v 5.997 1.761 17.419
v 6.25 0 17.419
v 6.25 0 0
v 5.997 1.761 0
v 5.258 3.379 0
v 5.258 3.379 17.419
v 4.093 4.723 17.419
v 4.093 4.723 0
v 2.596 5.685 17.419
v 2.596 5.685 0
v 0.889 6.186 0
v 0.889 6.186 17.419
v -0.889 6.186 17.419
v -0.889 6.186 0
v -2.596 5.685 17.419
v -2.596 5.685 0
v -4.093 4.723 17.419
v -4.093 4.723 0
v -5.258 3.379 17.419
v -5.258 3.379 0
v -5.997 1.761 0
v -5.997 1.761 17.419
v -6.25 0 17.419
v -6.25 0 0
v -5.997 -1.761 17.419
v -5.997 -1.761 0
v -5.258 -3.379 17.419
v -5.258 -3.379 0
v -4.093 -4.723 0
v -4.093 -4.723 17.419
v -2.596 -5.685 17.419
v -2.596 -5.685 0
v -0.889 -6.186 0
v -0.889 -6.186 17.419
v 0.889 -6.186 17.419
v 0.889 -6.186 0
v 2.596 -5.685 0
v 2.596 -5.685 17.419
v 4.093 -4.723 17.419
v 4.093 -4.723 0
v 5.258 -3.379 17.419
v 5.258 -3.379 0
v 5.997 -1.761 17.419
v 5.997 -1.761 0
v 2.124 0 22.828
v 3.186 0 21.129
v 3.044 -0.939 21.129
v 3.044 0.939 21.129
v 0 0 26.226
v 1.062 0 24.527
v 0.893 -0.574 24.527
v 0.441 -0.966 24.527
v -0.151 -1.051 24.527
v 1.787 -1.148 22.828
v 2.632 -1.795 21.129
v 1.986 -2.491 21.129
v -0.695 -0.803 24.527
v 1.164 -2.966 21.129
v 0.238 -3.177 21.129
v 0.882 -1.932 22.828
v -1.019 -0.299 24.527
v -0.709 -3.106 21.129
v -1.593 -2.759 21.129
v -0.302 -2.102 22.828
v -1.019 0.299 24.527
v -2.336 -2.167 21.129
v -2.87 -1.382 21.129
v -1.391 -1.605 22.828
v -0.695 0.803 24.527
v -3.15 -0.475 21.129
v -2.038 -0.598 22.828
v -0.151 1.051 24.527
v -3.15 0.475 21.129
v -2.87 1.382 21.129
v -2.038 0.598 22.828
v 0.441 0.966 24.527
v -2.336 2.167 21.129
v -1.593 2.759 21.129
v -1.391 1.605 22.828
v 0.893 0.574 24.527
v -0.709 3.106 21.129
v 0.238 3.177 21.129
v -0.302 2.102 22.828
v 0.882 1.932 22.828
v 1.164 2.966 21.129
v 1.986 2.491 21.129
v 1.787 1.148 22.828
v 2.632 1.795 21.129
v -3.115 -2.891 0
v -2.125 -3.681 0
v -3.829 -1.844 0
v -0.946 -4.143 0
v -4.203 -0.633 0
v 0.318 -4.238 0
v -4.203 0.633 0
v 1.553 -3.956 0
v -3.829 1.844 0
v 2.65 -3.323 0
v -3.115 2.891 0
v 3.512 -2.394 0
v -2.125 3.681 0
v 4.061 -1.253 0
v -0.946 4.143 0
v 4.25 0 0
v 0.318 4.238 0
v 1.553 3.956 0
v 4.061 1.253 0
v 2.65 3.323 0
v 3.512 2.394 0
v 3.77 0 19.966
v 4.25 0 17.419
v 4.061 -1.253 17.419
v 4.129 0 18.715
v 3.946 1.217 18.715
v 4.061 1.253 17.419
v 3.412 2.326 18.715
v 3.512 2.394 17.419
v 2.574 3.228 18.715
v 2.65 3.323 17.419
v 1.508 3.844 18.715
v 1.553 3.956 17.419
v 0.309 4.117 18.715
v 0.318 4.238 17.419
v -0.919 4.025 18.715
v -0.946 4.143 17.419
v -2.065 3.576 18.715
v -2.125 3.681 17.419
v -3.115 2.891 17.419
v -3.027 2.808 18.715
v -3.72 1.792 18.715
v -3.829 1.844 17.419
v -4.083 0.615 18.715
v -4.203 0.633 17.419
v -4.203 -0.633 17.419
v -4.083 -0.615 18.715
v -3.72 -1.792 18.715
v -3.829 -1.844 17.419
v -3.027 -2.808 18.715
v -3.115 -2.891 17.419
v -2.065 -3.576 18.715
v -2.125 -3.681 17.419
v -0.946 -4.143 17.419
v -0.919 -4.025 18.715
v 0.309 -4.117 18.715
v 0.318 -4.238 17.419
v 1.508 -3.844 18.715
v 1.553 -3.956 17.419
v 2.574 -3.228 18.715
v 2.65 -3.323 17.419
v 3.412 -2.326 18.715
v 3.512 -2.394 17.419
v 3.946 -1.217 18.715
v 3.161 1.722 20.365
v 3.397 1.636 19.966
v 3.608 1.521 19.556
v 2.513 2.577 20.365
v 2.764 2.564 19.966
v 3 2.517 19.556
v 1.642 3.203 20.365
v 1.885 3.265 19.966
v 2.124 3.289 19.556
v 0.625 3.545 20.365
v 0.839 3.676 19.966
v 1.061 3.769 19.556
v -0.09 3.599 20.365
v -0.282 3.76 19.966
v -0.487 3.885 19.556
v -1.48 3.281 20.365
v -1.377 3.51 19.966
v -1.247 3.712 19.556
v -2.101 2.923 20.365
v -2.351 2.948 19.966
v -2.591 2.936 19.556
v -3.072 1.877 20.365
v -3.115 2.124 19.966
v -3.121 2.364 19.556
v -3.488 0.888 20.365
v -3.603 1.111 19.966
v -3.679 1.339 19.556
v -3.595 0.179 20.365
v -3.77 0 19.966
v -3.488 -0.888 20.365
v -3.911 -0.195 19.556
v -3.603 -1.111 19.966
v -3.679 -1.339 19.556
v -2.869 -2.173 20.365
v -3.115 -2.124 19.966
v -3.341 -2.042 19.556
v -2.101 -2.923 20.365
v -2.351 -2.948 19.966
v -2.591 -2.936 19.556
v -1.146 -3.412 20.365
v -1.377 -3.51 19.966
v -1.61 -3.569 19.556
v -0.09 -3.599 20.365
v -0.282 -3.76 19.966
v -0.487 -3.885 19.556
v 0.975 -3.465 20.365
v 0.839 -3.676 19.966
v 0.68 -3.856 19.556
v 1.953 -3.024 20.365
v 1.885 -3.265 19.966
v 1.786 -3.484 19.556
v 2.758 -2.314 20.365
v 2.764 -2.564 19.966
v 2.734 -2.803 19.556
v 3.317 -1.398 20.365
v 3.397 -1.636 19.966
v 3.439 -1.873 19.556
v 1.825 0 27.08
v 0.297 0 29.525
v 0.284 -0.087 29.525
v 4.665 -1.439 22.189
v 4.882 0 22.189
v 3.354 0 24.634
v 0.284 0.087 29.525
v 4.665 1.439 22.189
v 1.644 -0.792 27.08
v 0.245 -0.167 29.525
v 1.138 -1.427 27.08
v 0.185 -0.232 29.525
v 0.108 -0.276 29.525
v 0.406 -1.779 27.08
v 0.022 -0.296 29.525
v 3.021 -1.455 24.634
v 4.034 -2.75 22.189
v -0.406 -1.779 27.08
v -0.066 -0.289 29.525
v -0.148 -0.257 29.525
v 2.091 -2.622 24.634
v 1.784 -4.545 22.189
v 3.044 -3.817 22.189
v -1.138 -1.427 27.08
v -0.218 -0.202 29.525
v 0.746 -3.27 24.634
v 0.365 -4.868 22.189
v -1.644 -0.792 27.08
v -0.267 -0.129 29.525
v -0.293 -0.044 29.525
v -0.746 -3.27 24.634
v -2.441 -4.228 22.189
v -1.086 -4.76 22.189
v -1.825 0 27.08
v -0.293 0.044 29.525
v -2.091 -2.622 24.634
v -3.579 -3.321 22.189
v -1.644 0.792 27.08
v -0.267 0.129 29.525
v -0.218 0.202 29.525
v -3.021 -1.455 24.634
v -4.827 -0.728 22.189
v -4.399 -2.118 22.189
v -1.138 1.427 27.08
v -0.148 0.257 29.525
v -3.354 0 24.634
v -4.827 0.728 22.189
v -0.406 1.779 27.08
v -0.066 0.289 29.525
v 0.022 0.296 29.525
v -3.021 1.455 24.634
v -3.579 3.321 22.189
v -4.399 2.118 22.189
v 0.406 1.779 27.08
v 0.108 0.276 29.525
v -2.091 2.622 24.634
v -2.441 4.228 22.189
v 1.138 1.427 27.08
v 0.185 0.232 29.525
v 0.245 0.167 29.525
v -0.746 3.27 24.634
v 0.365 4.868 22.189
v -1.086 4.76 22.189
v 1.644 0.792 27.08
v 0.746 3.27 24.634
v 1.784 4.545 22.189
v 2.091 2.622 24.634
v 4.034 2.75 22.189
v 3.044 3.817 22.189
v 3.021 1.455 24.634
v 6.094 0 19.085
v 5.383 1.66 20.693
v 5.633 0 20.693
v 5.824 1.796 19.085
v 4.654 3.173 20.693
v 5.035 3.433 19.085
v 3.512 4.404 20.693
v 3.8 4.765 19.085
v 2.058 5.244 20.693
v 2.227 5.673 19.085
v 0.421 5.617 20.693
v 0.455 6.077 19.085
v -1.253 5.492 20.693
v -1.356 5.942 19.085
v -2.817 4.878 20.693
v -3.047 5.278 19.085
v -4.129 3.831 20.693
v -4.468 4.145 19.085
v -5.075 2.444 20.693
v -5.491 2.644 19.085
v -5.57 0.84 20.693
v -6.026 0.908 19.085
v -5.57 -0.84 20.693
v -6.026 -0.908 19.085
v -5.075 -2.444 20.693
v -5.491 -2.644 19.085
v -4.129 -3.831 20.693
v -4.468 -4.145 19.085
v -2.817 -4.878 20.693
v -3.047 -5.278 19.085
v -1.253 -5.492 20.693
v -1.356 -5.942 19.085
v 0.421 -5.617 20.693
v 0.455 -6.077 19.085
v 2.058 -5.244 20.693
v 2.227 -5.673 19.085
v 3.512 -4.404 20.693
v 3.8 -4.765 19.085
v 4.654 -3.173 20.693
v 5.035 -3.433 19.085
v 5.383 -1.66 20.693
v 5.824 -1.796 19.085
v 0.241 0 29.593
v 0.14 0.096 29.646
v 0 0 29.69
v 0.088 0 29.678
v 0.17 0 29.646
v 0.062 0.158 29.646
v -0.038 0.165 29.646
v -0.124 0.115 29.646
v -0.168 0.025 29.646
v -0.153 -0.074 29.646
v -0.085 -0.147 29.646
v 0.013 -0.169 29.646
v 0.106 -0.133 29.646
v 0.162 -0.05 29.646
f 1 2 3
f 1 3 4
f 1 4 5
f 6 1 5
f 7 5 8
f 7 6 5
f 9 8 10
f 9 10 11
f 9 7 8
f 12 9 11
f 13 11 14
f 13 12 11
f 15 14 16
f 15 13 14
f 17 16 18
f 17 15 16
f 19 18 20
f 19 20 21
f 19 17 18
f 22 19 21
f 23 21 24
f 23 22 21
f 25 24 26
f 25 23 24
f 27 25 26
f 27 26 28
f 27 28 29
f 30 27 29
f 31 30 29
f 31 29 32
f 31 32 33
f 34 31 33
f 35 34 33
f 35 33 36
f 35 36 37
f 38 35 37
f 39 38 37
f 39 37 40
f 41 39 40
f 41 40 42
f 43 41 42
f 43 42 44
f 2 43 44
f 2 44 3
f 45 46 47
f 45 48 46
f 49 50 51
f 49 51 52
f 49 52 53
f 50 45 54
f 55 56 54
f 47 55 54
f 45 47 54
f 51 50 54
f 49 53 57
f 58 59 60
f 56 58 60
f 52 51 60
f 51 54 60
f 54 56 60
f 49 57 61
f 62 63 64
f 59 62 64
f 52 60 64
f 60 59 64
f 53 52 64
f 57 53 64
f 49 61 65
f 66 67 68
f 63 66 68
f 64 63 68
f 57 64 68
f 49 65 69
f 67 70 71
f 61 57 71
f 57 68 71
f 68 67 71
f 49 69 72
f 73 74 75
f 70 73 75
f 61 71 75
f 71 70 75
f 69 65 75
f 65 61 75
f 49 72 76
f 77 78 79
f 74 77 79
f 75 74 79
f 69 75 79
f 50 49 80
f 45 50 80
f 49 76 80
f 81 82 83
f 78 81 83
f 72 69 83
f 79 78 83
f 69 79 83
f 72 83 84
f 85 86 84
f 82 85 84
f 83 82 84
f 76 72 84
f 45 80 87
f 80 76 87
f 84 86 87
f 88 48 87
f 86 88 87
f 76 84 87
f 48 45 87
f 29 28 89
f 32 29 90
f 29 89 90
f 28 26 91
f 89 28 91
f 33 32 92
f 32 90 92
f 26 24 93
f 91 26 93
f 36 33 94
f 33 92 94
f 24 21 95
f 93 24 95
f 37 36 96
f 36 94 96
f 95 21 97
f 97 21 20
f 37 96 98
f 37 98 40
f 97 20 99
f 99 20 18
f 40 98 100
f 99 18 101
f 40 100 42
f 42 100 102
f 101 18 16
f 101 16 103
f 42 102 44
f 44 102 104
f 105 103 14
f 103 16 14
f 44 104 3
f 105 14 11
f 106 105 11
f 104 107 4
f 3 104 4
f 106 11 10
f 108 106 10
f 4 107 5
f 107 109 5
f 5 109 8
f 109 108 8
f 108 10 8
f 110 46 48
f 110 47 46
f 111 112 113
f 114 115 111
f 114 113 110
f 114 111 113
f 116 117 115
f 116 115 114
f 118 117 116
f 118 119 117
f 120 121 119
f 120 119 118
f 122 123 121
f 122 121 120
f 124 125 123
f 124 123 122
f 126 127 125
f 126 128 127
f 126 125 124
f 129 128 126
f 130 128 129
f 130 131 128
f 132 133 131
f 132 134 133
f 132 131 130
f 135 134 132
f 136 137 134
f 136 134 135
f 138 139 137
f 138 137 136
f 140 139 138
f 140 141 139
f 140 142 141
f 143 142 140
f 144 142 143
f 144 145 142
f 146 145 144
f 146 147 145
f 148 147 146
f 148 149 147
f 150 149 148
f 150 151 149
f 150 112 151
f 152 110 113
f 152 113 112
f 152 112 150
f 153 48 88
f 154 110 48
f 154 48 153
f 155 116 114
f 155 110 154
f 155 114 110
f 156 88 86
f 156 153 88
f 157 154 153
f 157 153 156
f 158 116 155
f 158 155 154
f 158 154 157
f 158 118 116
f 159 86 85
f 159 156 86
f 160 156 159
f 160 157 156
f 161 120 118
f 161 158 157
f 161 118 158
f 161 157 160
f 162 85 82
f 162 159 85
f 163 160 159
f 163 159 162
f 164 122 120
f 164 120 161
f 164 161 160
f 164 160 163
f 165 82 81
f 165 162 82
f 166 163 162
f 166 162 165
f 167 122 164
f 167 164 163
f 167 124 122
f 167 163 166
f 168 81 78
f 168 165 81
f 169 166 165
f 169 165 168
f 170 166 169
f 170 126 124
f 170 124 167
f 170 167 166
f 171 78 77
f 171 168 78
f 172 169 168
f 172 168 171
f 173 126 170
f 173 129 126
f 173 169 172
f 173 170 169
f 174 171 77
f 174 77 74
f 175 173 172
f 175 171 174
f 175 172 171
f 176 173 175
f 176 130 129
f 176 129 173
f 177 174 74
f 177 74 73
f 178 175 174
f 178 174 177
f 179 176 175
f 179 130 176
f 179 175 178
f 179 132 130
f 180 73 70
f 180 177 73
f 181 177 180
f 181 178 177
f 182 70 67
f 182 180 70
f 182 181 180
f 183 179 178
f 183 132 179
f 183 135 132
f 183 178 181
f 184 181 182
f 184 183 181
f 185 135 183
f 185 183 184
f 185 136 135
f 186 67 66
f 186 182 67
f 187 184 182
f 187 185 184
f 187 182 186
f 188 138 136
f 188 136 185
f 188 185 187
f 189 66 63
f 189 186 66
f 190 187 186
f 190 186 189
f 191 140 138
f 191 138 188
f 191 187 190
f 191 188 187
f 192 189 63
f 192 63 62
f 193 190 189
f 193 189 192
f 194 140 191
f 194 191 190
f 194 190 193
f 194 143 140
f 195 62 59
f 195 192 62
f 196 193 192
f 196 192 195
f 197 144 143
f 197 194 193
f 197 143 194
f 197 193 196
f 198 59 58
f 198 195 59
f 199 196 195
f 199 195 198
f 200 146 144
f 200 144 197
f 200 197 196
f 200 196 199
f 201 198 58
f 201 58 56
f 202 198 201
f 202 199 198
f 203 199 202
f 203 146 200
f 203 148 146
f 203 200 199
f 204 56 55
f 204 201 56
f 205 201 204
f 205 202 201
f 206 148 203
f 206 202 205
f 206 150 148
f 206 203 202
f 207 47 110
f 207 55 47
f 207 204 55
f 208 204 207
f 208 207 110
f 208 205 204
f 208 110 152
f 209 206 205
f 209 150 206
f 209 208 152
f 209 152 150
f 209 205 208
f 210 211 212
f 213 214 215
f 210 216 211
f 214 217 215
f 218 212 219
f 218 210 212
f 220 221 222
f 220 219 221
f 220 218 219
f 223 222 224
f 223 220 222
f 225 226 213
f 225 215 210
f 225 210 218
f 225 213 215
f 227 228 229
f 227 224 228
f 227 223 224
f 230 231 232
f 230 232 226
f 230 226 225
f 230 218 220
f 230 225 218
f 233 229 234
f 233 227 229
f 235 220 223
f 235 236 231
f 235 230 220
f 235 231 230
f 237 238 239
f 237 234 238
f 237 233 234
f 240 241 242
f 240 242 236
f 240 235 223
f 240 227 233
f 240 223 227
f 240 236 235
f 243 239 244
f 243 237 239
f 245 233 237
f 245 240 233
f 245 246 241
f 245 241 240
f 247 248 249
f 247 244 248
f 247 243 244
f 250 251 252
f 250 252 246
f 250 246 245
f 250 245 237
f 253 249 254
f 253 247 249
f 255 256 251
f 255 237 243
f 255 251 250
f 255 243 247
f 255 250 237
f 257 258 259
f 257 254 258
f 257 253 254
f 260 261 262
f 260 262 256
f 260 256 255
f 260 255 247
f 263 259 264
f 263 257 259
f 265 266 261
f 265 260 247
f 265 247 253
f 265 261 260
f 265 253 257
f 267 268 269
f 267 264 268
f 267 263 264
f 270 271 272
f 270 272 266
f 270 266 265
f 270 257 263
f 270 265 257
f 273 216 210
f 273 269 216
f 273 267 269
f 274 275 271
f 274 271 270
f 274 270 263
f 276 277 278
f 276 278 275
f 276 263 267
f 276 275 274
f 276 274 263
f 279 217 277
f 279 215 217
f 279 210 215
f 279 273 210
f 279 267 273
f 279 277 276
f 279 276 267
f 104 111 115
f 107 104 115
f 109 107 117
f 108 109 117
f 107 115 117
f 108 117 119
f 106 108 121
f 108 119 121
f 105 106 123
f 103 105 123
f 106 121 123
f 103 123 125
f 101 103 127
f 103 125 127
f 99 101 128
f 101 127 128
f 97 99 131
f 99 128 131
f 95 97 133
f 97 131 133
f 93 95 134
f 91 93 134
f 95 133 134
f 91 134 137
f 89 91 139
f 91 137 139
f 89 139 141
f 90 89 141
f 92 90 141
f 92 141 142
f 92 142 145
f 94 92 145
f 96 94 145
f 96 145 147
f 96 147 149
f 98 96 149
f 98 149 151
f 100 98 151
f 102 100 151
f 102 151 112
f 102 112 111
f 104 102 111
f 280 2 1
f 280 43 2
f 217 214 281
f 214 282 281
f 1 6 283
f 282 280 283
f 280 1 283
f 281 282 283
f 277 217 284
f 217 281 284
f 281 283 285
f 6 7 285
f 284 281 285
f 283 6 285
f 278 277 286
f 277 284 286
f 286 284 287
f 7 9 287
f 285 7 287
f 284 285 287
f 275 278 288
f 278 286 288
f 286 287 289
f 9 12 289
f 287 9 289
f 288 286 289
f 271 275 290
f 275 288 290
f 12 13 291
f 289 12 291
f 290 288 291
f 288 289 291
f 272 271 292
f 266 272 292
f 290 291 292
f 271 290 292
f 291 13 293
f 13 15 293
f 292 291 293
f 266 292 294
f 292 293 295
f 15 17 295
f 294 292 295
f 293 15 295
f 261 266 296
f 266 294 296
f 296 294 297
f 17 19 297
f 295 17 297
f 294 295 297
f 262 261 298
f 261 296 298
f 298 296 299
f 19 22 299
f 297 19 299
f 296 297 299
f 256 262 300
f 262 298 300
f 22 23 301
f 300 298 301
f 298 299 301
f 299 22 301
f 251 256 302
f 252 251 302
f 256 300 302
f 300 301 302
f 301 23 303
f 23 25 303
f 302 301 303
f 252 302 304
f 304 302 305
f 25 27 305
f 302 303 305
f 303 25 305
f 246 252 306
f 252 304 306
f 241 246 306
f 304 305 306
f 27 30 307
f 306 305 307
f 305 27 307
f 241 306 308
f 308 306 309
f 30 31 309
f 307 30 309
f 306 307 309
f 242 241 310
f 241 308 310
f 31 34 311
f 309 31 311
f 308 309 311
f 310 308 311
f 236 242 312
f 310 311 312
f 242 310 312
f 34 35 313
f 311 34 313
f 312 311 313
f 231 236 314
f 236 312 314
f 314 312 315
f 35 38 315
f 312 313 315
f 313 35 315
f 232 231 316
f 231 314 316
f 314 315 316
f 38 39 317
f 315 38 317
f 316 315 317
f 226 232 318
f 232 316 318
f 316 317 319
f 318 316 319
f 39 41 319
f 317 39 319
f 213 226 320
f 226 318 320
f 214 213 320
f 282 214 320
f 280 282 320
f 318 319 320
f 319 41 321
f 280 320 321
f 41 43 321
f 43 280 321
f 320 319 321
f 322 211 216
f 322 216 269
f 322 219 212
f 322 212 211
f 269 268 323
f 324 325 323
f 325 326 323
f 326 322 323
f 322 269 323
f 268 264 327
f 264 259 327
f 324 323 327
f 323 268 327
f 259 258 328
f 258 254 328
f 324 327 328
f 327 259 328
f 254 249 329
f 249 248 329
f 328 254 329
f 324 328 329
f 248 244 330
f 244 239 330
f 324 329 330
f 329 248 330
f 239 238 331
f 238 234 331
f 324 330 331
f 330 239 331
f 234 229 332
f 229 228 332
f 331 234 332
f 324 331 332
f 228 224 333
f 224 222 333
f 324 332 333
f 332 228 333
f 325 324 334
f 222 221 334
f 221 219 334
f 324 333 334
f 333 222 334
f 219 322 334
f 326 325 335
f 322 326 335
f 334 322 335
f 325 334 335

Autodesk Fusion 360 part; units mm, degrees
sketch "Schizzo2" plane through (0, 0, 0) normal (0, 1, 0) x (1, 0, 0)
  line L0 (6.25, 0) -> (6.25, -17.4188)
  line L1 (0.2968, -29.5251) -> (4.882, -22.1888)
  line L2 (0, -26.2264) -> (0, -29.6896)
  arc A0 (4.882, -22.1888) -> (6.25, -17.4188) centre (-2.75, -17.4188) ccw
  line L3 (0.9375, -28.5) -> (0, -28.5) construction
  arc A1 (0, -29.6896) -> (0.2968, -29.5251) centre (0, -29.3396) ccw
  line L4 (0, -26.2264) -> (3.186, -21.1288)
  arc A2 (3.186, -21.1288) -> (4.25, -17.4188) centre (-2.75, -17.4188) ccw
  line L5 (4.25, 0) -> (4.25, -17.4188)
  line L6 (6.25, 0) -> (4.25, 0)
  dimension "d9" = 6.25
  dimension "d24" = 9
  dimension "d25" = 0.35
revolve "Rivoluzione6" add sketch "Schizzo2" angle 360 about axis through (0, 0, 26.2264) along (0, 0, 1)
revolve "Rivoluzione5" [suppressed]
revolve "Rivoluzione3" [suppressed]
ref_plane "Piano di lavoro1" through (0, -3, 0) normal (0, 1, 0) x (0, 0, 1)
revolve "Rivoluzione4" [suppressed]
revolve "Rivoluzione2" [suppressed]
sketch "Schizzo3" plane through (0, 0, 0) normal (0, 1, 0) x (1, 0, 0)
  line L0 (0, 1) -> (0, -23)
revolve "Rivoluzione1" [suppressed]
equation "d9 = ( 12.5 / 2 ) * 1 mm"
